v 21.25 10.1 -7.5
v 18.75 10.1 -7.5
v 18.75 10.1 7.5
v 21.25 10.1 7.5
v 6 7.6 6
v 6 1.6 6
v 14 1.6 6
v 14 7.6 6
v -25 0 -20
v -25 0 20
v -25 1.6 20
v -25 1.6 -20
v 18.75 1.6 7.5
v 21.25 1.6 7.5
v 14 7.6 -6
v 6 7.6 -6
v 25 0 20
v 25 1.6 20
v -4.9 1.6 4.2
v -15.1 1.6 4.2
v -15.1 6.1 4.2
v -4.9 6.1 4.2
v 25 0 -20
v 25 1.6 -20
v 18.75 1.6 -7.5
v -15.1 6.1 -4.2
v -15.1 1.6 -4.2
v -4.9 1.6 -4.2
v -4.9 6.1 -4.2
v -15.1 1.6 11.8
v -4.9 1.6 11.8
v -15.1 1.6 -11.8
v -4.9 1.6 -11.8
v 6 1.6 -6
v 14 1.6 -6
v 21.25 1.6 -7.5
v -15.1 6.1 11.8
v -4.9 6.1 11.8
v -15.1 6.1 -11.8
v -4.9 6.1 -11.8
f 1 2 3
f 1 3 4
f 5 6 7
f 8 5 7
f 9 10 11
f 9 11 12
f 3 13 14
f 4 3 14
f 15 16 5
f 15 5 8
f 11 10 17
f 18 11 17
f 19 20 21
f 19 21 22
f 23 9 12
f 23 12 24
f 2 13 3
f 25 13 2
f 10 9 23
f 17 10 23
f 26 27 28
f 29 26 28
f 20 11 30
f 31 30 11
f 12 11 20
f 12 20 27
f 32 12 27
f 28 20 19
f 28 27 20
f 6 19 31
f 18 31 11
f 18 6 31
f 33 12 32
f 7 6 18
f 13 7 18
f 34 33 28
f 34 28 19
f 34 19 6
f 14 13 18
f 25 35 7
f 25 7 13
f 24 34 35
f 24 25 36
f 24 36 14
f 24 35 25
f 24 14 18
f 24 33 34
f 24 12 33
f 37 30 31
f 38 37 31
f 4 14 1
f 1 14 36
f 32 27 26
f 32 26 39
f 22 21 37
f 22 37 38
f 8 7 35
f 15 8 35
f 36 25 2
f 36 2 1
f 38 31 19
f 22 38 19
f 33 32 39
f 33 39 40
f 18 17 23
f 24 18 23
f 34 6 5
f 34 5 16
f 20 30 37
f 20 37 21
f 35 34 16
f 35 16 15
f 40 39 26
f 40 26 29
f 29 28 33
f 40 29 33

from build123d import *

# Parameters (mm, degrees)
SKETCH1_W          = 50
SKETCH1_H          = 40
BOARD_DEPTH        = 1.6
OPAMP_DIP8_1_START = 1.6
SKETCH2_W          = 10.2
SKETCH2_H          = 7.6
OPAMP_DIP8_1_DEPTH = 4.5
OPAMP_DIP8_2_START = 1.6
SKETCH3_W          = 10.2
SKETCH3_H          = 7.6
OPAMP_DIP8_2_DEPTH = 4.5
LED_DRIVER_START   = 1.6
SKETCH4_W          = 8
SKETCH4_H          = 12
LED_DRIVER_DEPTH   = 6
HEADER_START       = 1.6
SKETCH5_W          = 2.5
SKETCH5_H          = 15
HEADER_DEPTH       = 8.5


with BuildPart() as part:
    # Sketch1 → Board (new body)
    with BuildSketch(Plane(origin=(0, 0, 0), x_dir=(1, 0, 0), z_dir=(0, 1, 0))):
        Rectangle(SKETCH1_W, SKETCH1_H)
    extrude(amount=BOARD_DEPTH)

    # Sketch2 → OpAmp_DIP8_1 (add)
    with BuildSketch(Plane(origin=(0, 0, 0), x_dir=(1, 0, 0), z_dir=(0, 1, 0)).offset(OPAMP_DIP8_1_START)):
        with Locations((-10, 8)):
            Rectangle(SKETCH2_W, SKETCH2_H)
    extrude(amount=OPAMP_DIP8_1_DEPTH)

    # Sketch3 → OpAmp_DIP8_2 (add)
    with BuildSketch(Plane(origin=(0, 0, 0), x_dir=(1, 0, 0), z_dir=(0, 1, 0)).offset(OPAMP_DIP8_2_START)):
        with Locations((-10, -8)):
            Rectangle(SKETCH3_W, SKETCH3_H)
    extrude(amount=OPAMP_DIP8_2_DEPTH)

    # Sketch4 → LED_Driver (add)
    with BuildSketch(Plane(origin=(0, 0, 0), x_dir=(1, 0, 0), z_dir=(0, 1, 0)).offset(LED_DRIVER_START)):
        with Locations((10, 0)):
            Rectangle(SKETCH4_W, SKETCH4_H)
    extrude(amount=LED_DRIVER_DEPTH)

    # Sketch5 → Header (add)
    with BuildSketch(Plane(origin=(0, 0, 0), x_dir=(1, 0, 0), z_dir=(0, 1, 0)).offset(HEADER_START)):
        with Locations((20, 0)):
            Rectangle(SKETCH5_W, SKETCH5_H)
    extrude(amount=HEADER_DEPTH)


solid = part.part
